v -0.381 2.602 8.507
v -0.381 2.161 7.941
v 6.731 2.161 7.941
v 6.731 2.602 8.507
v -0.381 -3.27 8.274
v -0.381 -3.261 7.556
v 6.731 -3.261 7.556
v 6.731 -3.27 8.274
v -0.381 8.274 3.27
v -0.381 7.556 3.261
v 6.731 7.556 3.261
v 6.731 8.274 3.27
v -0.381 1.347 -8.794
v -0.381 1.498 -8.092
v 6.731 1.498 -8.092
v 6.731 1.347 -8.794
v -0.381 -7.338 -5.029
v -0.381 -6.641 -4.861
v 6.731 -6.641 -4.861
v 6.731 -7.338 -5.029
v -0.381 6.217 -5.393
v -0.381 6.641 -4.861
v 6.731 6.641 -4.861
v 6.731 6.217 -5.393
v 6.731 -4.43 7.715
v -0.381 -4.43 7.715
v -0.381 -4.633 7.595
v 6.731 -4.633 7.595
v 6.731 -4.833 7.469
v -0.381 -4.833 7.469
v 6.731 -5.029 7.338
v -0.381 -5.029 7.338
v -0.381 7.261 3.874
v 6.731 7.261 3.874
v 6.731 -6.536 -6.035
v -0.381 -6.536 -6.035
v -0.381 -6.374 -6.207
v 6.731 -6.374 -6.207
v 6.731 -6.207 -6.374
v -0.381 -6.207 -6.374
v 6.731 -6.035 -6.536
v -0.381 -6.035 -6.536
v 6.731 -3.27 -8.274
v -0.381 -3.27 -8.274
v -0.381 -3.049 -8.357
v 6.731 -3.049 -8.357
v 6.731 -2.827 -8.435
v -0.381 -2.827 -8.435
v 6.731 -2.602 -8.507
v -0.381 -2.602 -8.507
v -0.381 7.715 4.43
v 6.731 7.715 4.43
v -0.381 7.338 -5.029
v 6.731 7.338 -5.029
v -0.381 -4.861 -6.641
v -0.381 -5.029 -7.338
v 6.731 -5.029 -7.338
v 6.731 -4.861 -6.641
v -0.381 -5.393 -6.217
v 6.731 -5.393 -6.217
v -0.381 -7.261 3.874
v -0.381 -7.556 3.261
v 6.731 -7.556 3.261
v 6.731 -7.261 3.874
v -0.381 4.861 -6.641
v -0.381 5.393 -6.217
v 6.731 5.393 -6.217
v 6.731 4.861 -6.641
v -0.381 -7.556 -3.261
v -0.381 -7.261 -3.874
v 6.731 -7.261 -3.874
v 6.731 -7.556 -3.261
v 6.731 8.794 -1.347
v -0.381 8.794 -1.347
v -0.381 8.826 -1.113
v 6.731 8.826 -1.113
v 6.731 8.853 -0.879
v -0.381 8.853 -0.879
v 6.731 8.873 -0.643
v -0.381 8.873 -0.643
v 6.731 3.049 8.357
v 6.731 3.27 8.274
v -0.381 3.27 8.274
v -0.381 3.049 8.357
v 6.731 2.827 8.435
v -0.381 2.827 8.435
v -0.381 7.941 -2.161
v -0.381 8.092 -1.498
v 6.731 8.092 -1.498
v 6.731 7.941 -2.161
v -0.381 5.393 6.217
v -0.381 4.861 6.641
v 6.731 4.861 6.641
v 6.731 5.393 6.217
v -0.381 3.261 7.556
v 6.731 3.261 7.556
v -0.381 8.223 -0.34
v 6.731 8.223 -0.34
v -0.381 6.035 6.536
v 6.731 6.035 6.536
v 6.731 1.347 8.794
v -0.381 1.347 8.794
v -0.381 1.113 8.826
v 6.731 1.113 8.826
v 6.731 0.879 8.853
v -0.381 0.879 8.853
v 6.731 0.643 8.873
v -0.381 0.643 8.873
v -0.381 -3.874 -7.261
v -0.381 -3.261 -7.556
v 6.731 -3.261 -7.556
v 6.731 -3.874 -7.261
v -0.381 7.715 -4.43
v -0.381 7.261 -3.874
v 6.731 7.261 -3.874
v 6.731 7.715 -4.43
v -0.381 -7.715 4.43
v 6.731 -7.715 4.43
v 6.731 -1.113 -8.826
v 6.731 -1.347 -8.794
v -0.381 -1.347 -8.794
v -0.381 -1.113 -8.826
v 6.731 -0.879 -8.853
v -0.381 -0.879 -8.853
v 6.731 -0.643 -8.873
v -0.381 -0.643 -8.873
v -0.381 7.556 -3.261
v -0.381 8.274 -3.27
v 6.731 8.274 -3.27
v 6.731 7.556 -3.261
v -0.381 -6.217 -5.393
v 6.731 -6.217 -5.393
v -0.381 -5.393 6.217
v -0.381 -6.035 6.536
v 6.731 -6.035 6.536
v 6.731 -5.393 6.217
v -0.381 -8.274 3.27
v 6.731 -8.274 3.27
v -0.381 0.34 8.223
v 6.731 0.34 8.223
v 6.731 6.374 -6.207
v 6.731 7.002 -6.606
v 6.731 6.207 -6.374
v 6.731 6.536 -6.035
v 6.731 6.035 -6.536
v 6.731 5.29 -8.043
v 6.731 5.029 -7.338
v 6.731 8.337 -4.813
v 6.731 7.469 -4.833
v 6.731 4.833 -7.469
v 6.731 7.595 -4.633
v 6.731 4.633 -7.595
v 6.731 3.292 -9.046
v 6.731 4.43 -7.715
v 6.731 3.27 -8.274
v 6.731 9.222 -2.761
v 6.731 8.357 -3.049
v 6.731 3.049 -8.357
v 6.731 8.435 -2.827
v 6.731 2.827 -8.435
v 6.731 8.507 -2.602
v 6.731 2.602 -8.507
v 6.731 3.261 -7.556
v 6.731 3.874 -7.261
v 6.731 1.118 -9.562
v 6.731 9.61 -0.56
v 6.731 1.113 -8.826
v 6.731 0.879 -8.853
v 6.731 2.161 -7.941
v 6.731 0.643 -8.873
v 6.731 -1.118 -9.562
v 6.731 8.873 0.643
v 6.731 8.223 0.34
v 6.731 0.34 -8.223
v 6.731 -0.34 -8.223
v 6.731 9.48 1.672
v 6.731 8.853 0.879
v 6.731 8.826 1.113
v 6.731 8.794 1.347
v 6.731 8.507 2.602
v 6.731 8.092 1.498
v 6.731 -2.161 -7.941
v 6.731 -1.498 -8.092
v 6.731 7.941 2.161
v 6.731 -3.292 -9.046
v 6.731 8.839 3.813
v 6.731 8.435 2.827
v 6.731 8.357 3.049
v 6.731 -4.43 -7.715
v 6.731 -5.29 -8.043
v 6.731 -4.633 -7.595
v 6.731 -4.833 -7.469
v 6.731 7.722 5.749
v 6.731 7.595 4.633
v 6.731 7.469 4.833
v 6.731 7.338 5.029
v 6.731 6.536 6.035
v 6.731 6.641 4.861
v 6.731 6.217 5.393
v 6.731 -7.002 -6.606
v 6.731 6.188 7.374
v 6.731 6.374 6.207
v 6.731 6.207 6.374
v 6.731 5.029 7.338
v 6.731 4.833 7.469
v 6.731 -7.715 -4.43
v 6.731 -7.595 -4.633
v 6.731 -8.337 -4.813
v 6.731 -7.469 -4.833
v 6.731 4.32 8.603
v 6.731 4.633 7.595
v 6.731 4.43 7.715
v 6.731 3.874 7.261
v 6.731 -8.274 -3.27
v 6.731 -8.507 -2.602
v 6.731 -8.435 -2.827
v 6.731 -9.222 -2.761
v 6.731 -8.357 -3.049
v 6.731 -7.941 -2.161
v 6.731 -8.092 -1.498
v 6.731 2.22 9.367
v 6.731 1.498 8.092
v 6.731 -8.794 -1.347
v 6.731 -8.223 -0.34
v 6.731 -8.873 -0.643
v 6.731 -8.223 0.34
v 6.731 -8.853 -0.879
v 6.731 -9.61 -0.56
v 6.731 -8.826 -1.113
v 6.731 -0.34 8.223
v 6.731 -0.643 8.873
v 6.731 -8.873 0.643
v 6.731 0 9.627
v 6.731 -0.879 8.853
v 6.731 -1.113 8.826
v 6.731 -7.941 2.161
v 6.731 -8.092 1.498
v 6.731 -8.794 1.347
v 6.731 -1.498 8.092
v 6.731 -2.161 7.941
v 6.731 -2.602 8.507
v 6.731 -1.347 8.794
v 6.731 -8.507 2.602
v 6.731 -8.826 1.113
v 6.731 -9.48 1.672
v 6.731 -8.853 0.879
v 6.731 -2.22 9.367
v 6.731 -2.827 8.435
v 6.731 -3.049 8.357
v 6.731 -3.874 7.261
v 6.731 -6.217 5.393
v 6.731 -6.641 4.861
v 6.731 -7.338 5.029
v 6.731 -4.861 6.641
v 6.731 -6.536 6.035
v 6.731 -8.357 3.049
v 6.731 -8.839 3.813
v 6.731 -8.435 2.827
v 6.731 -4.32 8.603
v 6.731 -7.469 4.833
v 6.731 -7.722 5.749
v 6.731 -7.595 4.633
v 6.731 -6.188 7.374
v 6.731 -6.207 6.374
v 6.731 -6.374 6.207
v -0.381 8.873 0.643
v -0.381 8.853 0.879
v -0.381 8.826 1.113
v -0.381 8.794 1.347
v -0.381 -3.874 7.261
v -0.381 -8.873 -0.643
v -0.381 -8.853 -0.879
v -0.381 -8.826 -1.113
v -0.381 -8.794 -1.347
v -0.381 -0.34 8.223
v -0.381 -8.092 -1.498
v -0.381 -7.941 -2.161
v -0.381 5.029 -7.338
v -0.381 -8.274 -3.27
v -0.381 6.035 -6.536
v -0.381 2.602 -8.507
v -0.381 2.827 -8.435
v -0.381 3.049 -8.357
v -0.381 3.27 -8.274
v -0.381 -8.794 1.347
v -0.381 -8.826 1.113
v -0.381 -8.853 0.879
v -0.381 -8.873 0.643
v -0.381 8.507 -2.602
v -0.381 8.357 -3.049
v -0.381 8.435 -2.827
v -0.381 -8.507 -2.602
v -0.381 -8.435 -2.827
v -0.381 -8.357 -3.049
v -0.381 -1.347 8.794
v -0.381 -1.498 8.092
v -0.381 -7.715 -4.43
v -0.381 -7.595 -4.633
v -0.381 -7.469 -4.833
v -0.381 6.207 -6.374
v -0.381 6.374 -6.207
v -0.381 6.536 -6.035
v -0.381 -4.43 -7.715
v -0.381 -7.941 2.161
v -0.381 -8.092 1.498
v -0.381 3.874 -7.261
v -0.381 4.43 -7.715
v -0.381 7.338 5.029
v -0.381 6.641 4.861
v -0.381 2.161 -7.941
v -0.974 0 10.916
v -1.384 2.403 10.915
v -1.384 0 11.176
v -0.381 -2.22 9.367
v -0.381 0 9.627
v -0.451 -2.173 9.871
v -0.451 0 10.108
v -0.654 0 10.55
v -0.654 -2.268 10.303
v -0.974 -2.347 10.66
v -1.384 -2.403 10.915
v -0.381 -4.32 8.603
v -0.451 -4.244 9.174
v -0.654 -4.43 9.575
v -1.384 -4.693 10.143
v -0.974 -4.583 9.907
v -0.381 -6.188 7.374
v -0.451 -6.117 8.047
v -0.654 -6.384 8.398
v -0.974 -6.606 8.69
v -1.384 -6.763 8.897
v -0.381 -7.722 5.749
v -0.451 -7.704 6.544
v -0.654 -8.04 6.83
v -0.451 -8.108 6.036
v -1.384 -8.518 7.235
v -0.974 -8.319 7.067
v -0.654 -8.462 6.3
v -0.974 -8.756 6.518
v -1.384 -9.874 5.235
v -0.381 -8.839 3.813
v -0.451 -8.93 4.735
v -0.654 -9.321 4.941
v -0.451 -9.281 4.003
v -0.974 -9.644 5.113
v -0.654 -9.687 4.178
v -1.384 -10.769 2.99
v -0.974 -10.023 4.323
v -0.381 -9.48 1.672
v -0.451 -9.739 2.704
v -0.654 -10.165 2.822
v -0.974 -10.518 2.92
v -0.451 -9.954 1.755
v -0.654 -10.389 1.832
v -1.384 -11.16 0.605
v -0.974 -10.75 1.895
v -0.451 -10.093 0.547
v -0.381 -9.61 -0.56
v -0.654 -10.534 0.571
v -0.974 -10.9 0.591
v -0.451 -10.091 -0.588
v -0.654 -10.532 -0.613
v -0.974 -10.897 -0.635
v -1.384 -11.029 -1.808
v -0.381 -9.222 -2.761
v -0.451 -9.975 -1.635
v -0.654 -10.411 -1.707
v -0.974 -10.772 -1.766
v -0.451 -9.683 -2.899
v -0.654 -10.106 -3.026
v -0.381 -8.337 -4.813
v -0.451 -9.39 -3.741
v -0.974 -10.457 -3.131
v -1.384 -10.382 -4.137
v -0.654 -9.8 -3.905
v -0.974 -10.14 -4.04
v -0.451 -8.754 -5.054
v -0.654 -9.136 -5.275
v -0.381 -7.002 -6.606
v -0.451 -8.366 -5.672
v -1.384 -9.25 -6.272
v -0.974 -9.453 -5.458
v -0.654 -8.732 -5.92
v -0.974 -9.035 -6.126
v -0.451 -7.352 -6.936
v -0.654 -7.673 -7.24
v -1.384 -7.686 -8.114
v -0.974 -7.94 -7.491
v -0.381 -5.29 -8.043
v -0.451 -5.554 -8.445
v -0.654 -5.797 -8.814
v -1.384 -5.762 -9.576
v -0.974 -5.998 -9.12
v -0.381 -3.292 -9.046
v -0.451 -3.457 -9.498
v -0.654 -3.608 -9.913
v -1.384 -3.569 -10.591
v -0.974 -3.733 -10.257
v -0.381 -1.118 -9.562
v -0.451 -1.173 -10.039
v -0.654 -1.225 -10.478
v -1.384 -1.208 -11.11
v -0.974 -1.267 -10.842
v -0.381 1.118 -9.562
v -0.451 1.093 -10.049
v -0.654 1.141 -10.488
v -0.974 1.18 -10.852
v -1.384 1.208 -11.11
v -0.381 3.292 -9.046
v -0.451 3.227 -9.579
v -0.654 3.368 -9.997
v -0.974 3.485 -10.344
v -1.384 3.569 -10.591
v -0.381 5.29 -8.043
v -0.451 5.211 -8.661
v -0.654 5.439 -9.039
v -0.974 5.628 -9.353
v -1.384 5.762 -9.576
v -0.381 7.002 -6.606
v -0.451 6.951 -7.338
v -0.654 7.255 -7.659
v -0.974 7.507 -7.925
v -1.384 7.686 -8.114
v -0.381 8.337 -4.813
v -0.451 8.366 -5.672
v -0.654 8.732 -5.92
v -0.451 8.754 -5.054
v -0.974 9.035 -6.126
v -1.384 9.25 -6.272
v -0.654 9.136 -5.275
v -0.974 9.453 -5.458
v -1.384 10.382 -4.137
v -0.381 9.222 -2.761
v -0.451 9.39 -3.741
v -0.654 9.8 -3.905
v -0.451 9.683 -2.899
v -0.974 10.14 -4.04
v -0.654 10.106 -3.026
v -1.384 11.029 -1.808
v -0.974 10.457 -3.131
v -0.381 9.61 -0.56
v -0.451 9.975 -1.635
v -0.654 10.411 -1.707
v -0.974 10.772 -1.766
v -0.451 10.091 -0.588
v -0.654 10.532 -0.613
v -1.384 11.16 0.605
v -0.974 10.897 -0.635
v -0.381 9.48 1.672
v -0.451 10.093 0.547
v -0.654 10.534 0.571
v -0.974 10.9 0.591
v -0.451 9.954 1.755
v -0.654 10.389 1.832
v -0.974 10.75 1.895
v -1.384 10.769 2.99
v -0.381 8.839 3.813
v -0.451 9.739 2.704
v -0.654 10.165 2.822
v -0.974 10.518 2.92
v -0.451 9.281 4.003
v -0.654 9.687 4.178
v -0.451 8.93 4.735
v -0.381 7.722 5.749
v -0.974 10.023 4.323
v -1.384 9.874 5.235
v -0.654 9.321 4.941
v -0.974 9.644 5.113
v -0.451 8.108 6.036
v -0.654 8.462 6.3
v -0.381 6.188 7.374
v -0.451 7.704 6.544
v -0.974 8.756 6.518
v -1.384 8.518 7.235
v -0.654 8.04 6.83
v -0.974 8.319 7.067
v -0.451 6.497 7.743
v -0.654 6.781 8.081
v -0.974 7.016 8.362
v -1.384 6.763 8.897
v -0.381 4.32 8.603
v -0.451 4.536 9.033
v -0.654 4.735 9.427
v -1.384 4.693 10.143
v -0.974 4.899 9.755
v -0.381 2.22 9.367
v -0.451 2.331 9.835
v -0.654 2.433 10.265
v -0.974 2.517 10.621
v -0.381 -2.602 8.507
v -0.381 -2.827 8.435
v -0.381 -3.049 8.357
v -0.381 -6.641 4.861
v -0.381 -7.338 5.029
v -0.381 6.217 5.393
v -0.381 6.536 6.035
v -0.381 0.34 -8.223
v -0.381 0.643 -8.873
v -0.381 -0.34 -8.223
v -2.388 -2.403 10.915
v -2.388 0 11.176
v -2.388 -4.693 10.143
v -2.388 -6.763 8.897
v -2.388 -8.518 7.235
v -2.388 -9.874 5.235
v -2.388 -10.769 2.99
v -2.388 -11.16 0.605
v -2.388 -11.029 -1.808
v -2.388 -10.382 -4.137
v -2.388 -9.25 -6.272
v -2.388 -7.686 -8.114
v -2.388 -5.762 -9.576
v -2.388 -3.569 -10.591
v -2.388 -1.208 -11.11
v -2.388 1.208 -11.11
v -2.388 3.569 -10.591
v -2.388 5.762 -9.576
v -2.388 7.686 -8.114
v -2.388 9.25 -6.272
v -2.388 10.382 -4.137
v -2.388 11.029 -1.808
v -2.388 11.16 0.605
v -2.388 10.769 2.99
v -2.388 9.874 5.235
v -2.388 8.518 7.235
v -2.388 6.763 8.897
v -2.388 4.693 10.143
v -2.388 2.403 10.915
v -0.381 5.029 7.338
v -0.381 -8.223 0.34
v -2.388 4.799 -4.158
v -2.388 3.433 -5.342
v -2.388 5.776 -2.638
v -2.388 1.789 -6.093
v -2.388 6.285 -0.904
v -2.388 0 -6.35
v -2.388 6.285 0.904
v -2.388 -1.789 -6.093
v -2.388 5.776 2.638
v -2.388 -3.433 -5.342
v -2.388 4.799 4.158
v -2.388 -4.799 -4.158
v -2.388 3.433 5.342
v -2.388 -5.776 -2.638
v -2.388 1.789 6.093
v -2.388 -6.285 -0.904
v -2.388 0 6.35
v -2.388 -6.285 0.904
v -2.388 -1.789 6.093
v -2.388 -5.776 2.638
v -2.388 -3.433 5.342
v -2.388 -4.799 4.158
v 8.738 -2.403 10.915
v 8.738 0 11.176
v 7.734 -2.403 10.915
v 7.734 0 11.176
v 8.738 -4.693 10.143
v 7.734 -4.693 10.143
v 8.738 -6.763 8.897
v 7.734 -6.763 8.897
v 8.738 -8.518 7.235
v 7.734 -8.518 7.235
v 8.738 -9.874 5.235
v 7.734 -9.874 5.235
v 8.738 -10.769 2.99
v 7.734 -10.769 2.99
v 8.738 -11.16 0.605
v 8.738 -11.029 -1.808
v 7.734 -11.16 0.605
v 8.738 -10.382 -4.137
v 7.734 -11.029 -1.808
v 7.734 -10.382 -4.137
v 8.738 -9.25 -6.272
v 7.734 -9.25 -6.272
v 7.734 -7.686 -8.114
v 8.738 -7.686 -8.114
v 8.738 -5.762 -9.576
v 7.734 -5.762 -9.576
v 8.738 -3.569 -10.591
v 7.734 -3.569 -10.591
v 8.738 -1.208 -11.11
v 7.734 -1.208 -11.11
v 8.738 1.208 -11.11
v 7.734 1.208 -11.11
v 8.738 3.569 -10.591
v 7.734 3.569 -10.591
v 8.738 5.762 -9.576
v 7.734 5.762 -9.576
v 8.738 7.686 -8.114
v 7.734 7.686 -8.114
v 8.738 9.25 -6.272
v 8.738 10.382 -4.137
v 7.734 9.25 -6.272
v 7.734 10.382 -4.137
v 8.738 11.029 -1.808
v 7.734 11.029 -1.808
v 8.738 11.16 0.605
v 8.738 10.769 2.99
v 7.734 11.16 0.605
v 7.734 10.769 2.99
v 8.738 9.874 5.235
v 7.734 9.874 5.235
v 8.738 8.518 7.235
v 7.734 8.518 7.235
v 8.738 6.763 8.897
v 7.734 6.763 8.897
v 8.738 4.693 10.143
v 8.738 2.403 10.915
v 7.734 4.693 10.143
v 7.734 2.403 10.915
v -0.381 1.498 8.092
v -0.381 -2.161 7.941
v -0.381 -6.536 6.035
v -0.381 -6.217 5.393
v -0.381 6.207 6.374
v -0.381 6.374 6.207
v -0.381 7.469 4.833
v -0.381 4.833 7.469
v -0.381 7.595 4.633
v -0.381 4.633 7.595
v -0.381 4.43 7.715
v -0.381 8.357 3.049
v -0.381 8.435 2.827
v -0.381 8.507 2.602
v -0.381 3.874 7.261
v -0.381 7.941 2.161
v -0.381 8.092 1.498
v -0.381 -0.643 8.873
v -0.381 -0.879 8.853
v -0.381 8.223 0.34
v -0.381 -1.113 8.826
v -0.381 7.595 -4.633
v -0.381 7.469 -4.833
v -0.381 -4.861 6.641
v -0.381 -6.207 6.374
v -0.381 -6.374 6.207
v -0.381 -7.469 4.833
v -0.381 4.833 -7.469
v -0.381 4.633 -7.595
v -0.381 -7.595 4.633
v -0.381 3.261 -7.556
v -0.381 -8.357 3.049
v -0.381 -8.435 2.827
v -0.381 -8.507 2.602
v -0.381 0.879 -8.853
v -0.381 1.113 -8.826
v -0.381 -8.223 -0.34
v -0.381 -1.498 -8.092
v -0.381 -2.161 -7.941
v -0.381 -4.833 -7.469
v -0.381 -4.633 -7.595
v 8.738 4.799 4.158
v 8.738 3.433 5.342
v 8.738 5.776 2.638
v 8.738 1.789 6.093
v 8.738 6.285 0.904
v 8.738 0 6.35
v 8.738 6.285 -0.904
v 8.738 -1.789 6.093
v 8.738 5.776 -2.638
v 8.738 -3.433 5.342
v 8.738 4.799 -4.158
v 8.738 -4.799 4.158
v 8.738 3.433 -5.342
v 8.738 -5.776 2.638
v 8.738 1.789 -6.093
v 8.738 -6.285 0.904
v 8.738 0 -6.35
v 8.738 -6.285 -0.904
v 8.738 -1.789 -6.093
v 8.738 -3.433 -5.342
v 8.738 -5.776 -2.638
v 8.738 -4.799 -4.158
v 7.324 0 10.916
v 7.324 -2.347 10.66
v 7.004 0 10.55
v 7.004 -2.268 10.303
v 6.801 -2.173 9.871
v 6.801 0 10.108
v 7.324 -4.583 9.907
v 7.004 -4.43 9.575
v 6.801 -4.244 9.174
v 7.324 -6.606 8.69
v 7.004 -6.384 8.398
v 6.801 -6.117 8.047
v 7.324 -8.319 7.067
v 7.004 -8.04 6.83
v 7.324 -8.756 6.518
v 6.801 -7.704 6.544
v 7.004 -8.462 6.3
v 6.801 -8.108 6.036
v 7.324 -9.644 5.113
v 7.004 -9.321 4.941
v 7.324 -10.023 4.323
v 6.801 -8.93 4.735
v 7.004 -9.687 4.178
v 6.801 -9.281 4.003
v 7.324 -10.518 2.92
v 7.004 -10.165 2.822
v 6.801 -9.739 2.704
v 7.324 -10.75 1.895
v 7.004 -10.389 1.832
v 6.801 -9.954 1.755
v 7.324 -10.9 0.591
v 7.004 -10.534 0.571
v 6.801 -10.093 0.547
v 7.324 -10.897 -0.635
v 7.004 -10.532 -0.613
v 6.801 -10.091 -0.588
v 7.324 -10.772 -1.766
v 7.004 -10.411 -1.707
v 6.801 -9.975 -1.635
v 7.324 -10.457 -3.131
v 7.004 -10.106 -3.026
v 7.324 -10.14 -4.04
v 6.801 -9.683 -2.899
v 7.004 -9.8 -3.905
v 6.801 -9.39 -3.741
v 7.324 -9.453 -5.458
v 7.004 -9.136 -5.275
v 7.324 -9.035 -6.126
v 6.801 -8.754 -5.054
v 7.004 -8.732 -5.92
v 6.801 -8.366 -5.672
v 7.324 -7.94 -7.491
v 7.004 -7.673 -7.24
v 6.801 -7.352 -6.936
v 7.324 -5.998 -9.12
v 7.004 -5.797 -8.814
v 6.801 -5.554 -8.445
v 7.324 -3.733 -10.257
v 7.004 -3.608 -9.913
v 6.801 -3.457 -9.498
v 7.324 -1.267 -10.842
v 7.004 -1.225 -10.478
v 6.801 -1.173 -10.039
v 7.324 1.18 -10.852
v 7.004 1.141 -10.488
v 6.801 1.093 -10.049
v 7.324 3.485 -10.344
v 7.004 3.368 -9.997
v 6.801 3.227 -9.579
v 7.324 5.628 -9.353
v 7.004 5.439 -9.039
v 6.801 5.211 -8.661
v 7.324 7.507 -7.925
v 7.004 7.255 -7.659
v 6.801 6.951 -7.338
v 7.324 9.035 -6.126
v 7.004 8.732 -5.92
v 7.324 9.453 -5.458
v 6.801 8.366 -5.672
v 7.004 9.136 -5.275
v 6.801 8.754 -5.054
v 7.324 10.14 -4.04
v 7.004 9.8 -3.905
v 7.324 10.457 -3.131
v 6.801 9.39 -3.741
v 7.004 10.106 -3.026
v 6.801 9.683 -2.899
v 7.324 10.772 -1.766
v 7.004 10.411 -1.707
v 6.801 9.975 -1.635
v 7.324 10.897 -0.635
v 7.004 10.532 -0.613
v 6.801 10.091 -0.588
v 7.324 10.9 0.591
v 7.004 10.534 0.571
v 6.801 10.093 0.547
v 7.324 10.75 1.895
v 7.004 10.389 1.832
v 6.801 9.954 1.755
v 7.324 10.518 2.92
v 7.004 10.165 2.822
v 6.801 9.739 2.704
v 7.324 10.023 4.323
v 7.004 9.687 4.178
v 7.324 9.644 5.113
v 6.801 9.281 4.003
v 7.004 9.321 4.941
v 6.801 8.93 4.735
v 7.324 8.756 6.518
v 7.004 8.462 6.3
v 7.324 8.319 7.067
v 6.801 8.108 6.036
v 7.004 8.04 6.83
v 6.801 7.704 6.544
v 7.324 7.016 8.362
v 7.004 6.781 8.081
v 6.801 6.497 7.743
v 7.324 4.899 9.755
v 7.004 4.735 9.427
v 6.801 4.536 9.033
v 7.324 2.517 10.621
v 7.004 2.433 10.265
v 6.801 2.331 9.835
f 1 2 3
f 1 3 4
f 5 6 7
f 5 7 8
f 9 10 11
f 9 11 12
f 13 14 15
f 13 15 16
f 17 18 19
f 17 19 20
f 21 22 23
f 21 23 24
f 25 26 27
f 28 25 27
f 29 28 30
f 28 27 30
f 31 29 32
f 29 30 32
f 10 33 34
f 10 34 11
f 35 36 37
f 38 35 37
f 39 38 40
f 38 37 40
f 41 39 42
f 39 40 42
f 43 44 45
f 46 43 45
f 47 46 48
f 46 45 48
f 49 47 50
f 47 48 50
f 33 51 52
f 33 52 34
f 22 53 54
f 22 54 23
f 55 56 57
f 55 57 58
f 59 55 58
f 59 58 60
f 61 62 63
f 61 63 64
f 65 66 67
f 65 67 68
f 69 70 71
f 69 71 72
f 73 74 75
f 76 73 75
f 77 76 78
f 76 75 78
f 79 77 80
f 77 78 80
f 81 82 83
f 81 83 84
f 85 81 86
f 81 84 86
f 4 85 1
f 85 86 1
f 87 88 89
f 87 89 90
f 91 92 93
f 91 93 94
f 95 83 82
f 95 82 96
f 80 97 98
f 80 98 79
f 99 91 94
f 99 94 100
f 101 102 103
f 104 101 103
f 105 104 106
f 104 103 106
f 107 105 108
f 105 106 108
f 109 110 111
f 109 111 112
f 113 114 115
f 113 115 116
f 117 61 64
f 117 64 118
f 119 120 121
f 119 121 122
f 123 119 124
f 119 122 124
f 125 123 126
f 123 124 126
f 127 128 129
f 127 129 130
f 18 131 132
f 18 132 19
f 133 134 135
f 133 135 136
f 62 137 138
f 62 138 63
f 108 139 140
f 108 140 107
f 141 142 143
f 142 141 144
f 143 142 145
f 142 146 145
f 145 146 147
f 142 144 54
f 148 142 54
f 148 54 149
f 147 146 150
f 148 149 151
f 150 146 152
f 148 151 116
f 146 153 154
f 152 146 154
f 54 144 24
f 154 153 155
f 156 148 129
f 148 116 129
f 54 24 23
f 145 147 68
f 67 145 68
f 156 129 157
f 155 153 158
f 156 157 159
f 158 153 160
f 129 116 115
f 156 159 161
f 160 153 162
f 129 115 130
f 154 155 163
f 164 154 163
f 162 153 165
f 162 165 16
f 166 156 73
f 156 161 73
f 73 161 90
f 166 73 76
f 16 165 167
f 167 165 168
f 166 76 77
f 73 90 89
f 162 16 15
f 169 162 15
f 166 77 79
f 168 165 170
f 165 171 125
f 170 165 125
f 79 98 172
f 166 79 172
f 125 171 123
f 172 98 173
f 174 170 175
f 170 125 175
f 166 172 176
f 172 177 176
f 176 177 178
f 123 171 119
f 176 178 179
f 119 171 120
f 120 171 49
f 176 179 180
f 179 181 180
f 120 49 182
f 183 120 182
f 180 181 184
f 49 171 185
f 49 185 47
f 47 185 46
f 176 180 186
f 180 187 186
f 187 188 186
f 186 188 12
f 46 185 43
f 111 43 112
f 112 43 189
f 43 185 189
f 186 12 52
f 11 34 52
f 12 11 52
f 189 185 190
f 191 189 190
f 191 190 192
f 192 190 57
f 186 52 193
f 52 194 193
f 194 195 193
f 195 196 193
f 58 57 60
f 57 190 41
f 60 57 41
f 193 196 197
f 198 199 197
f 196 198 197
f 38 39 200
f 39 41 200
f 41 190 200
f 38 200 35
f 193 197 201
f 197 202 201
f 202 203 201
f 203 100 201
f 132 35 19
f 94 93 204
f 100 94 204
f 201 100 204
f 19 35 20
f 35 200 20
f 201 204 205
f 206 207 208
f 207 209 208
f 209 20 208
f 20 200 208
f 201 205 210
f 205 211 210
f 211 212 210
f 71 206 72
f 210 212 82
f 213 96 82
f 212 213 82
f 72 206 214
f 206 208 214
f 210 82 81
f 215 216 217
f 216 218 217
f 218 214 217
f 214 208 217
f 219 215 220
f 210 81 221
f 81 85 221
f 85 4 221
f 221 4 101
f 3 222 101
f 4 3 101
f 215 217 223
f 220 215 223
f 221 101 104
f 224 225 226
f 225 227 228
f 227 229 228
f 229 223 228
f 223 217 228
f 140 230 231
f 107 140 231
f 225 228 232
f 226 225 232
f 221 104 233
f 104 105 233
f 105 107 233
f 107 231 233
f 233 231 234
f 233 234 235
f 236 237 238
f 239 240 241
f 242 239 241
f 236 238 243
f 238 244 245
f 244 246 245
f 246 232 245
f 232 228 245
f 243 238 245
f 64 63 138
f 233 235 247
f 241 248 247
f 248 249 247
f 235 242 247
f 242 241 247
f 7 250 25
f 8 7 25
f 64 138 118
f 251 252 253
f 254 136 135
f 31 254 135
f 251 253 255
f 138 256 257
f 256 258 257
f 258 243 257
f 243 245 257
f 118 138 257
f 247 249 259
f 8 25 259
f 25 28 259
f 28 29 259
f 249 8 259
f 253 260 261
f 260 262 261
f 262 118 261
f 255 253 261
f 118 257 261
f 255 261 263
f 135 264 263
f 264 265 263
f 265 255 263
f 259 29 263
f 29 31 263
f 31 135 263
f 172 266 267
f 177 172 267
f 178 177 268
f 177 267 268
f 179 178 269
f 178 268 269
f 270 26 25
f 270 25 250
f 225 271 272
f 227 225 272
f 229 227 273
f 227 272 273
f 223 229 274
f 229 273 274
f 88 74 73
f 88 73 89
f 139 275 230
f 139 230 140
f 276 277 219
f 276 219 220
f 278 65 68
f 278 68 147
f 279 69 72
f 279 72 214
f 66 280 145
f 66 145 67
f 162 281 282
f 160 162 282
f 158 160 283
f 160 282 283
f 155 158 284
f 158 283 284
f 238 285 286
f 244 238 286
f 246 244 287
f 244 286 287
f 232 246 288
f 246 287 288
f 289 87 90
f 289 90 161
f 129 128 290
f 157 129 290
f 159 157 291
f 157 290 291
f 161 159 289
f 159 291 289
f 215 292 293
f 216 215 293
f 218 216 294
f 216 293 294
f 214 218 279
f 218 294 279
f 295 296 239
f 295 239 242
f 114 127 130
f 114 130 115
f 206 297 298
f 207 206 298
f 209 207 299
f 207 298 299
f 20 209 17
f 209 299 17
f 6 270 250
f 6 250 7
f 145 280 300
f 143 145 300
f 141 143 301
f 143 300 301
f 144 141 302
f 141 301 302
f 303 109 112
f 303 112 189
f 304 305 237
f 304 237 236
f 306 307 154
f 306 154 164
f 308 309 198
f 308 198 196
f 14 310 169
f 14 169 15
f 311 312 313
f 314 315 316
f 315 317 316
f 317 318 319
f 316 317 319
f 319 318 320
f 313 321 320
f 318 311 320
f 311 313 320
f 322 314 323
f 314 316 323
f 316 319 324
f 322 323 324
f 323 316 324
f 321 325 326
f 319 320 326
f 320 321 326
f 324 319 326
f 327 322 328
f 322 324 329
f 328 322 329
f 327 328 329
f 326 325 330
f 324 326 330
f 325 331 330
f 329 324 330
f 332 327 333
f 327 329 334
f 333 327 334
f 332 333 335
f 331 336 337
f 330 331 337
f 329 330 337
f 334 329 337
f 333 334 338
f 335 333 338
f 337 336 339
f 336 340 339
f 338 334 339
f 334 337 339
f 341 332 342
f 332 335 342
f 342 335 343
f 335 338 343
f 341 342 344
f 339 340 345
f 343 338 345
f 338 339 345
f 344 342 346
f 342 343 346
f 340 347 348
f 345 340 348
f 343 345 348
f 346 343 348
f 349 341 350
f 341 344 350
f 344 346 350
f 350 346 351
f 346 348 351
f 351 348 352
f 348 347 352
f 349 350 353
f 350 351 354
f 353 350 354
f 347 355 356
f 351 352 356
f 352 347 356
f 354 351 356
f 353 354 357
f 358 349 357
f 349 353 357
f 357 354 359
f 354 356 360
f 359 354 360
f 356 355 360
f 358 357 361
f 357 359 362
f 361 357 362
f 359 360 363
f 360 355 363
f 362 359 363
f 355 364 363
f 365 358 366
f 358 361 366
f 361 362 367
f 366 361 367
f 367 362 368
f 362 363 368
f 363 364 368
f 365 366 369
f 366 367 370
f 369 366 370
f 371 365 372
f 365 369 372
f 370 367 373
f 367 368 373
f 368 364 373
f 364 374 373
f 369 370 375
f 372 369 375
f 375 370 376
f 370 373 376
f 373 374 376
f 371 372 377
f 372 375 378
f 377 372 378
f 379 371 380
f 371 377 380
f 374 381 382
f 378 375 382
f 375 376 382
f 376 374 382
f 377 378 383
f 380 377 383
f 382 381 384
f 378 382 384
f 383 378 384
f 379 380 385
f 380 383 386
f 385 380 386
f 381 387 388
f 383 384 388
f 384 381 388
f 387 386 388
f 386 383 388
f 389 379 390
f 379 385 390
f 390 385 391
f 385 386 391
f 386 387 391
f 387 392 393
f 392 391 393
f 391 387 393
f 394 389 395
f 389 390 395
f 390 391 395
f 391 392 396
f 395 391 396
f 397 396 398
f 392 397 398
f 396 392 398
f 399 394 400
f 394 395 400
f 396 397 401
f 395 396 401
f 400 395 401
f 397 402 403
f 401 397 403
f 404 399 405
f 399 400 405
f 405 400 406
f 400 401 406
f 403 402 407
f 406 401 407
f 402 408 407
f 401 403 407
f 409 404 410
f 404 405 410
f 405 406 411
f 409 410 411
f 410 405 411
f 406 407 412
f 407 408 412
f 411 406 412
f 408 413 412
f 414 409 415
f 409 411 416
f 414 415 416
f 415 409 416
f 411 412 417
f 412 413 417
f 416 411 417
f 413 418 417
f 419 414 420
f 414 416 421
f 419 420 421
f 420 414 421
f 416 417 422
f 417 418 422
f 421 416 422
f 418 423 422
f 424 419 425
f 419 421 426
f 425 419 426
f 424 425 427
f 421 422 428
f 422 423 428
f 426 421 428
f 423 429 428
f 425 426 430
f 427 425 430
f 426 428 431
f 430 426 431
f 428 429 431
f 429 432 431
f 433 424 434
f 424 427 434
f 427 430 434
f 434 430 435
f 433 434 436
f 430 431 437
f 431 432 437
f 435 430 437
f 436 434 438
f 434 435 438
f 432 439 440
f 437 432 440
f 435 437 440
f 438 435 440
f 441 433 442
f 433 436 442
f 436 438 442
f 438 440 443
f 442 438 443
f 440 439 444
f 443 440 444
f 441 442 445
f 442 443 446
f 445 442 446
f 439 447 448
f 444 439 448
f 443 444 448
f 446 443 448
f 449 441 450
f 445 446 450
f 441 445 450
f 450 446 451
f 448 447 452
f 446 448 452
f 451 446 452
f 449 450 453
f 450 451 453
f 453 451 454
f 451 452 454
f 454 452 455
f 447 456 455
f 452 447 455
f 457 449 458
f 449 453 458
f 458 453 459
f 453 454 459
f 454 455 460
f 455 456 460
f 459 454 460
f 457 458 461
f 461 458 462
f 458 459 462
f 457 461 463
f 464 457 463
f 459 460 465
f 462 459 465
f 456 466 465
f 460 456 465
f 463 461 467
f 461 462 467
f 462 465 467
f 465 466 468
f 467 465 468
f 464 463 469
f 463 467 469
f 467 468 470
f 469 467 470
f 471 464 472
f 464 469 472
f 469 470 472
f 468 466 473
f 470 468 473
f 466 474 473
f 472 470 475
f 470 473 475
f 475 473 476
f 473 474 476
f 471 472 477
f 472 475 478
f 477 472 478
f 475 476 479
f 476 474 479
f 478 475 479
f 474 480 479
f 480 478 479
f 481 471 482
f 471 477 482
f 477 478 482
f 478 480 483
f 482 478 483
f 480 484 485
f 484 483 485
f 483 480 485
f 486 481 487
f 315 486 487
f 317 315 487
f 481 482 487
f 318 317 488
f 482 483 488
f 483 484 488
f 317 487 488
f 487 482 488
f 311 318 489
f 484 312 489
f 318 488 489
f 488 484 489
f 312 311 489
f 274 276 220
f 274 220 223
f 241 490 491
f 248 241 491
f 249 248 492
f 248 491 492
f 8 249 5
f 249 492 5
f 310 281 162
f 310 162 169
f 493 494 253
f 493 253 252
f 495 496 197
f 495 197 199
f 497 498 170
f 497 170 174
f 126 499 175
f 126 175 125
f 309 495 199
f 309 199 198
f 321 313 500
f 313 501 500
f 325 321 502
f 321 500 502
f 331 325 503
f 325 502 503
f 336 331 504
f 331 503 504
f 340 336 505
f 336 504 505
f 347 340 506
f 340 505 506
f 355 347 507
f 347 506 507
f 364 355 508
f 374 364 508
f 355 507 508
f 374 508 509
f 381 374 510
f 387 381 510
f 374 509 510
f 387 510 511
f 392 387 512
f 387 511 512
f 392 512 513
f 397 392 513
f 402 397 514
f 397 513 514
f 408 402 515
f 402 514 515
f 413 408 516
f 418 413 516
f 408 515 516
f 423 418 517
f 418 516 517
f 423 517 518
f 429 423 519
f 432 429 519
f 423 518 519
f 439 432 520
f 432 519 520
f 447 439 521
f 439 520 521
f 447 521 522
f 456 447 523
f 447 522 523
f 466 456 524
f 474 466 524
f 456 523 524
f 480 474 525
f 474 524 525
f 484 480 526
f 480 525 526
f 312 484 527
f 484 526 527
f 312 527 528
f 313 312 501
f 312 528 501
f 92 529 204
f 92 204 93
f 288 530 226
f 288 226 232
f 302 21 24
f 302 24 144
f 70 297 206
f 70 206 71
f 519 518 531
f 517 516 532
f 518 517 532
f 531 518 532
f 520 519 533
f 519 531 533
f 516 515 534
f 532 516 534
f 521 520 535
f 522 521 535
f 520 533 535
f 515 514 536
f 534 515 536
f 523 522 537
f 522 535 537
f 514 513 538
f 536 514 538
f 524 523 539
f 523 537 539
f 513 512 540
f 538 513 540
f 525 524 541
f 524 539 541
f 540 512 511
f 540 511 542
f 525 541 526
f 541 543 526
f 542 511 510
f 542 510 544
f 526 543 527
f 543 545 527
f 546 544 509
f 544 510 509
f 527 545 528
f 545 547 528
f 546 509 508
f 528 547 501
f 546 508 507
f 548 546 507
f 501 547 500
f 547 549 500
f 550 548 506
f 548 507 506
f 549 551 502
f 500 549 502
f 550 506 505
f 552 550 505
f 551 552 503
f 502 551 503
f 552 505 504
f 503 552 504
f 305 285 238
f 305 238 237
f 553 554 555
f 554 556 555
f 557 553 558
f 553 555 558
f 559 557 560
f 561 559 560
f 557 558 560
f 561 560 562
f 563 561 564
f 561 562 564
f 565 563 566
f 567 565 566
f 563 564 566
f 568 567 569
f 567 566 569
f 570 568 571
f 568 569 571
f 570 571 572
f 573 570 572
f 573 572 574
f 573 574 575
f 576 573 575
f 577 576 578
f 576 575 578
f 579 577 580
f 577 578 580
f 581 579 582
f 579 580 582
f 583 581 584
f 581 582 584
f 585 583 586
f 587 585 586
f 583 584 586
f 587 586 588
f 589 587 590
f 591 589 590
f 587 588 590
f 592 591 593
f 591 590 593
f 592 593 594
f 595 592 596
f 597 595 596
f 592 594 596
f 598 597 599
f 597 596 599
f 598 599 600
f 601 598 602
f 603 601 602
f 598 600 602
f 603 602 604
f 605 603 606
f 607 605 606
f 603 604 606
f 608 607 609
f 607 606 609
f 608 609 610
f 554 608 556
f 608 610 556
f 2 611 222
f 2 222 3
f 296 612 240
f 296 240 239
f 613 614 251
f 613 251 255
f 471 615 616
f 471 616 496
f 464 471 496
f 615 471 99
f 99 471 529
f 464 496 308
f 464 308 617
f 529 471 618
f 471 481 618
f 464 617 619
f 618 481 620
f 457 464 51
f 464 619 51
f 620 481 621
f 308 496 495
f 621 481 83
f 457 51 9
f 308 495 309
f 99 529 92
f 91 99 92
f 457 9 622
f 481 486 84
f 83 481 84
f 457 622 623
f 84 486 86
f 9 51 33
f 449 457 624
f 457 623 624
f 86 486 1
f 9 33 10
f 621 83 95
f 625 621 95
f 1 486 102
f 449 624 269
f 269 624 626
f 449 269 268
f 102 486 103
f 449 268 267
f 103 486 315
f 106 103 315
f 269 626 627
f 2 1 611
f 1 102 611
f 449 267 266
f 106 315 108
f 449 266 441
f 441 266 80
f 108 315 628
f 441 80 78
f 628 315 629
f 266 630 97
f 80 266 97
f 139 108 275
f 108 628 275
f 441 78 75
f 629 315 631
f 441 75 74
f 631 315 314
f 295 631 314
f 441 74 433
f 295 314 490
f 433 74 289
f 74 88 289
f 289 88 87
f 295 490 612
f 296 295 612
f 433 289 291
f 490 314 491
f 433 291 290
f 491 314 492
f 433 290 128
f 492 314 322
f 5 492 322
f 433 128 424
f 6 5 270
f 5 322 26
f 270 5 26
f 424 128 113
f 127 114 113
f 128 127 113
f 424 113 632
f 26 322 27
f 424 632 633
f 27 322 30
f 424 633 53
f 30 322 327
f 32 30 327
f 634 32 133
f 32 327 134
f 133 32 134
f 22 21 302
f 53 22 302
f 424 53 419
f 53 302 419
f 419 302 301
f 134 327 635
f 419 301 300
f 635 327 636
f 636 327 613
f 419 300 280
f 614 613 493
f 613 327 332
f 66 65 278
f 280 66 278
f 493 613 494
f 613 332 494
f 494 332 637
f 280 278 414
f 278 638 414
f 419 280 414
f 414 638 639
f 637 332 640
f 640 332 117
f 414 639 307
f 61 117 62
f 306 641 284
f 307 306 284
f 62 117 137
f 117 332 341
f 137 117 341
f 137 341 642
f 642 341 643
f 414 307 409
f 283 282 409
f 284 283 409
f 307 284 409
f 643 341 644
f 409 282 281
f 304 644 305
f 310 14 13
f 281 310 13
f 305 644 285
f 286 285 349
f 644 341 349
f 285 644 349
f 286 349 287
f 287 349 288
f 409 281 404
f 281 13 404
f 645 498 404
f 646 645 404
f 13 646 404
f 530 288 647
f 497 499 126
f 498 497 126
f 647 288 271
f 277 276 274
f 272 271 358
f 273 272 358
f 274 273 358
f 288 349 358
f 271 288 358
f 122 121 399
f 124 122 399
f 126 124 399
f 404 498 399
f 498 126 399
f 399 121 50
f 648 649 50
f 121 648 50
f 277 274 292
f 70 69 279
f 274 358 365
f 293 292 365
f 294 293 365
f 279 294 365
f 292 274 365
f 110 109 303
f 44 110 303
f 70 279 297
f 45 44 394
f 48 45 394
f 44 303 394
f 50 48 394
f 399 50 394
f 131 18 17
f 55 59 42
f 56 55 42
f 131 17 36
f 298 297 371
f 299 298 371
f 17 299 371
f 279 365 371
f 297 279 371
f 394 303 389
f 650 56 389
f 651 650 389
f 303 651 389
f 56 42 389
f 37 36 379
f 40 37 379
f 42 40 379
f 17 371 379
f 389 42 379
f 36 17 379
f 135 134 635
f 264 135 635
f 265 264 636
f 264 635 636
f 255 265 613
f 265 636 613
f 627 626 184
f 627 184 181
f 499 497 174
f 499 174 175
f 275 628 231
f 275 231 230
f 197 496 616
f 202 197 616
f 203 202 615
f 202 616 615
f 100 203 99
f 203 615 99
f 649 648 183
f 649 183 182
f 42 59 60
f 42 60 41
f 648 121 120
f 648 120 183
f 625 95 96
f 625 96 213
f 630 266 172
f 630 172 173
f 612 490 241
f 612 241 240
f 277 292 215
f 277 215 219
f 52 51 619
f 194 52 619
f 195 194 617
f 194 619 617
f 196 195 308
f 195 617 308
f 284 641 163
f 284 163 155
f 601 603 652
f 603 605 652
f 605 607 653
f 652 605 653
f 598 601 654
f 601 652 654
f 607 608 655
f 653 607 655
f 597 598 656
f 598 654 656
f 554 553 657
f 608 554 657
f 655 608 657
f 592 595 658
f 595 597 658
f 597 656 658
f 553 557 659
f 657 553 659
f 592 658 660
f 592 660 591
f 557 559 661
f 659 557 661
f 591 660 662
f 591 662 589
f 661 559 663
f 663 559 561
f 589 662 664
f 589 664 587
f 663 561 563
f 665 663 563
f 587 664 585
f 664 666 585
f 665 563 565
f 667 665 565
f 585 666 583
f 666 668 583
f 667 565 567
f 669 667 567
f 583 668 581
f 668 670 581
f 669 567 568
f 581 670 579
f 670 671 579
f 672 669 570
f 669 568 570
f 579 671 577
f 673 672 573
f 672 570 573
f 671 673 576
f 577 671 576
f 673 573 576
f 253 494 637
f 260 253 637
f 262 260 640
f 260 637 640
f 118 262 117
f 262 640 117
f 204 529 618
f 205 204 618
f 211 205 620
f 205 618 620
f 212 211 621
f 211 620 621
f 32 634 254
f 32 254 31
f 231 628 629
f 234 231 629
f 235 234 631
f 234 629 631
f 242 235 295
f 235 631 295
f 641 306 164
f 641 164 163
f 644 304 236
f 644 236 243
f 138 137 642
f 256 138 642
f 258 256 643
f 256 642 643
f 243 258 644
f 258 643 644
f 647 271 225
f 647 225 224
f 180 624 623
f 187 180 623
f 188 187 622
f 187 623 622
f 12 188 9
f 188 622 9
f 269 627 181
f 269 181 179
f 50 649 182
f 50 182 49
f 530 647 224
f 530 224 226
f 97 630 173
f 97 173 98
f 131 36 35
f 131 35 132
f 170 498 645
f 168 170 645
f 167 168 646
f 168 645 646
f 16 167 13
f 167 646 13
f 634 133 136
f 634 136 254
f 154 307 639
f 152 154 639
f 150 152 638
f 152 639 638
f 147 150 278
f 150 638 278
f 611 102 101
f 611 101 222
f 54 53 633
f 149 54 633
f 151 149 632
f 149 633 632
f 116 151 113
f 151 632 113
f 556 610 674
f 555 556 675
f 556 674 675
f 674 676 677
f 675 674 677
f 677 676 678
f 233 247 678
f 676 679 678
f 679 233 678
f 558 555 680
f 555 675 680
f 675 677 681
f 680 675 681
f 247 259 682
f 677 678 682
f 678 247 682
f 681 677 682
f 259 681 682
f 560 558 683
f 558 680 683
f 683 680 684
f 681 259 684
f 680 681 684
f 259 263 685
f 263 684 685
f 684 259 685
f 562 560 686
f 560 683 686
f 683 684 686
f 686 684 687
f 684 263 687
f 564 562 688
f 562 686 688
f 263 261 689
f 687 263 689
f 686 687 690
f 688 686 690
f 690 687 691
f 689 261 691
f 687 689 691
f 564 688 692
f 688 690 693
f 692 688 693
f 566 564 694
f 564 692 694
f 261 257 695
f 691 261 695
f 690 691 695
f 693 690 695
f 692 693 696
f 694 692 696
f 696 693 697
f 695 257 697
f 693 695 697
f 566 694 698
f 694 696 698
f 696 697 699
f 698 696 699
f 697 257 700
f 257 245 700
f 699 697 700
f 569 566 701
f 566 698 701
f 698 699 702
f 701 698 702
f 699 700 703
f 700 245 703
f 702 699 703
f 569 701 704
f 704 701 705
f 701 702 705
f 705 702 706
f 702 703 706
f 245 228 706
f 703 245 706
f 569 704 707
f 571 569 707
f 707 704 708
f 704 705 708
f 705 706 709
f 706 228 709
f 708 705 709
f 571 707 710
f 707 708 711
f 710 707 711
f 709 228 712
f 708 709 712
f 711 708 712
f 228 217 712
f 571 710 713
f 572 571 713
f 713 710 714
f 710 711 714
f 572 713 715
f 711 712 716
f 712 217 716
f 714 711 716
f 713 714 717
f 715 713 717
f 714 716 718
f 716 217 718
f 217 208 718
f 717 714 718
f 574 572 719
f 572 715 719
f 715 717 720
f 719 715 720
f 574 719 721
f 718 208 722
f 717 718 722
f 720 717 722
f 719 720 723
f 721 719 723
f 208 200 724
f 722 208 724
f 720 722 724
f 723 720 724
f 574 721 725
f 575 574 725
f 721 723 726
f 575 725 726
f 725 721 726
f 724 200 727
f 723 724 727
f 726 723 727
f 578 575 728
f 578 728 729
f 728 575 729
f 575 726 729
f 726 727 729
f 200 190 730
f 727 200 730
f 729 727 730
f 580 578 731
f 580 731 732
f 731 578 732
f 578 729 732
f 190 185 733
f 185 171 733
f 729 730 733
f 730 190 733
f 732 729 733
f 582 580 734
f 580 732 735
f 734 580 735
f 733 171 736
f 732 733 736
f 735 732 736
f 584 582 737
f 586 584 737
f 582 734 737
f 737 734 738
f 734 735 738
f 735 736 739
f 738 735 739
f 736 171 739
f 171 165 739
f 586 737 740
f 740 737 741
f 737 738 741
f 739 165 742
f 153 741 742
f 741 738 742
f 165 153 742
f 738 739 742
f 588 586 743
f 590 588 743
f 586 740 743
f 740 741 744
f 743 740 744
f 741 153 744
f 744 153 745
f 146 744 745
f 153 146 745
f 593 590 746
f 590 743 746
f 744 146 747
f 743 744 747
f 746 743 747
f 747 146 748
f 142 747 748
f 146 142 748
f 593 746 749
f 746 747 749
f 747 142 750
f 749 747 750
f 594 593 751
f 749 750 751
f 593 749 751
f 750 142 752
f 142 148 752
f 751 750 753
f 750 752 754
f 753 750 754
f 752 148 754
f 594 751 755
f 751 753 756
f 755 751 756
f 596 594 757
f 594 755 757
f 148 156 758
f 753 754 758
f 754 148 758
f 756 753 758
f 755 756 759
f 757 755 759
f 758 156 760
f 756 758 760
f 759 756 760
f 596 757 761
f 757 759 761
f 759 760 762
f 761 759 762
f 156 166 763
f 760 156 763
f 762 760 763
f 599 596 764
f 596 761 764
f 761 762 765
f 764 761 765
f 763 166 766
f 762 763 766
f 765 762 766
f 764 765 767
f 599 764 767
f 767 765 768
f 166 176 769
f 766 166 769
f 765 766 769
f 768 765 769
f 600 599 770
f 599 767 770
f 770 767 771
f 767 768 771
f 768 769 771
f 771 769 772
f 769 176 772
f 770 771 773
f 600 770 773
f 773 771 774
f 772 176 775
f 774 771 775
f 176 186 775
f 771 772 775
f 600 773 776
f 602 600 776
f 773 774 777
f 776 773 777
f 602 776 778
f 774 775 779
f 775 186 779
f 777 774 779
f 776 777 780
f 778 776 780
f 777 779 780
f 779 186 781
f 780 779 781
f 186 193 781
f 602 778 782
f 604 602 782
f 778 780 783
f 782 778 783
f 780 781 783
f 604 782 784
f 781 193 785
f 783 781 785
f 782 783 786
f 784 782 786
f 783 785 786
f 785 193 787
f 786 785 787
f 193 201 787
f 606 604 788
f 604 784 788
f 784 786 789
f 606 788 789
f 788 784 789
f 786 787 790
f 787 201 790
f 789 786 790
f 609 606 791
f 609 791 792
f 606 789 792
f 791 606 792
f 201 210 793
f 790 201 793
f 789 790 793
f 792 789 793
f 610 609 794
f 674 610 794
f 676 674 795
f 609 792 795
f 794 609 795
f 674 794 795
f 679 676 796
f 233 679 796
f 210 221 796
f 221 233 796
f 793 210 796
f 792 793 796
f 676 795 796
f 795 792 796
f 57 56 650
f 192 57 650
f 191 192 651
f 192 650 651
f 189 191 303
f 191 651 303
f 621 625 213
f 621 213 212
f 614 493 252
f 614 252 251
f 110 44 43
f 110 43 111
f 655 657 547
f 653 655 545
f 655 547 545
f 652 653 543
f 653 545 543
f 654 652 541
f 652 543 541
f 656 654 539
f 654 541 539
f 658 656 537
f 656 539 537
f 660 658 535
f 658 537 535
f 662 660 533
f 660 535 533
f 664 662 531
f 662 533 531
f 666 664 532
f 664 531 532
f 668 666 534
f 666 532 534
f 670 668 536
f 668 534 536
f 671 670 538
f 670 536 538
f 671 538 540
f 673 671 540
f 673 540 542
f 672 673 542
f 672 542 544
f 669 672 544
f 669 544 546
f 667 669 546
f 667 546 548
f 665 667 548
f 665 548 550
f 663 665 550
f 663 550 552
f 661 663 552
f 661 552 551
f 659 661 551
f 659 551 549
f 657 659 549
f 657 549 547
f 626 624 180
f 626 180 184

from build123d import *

# Parameters (mm, degrees)
SKETCH4_R          = 9.0551
SKETCH4_R_2        = 8.89635
CUT_EXTRUDE2_DEPTH = 7.112
CUT_EXTRUDE1_DEPTH = 7.112
CIRPATTERN1_COUNT  = 28
SKETCH6_R          = 6.35
CUT_EXTRUDE3_DEPTH = 24.562439751
SPLIT1_START       = -8.7376
SPLIT1_OUTLINE_R   = 8.7376
SPLIT1_OUTLINE_R_2 = 6.35
SPLIT1_DEPTH       = 6.35


# Read off the part's stored shape, not the designer's step: Split1
with BuildPart() as part:
    # Sketch1 → Revolve1 (revolve)
    with BuildSketch(Plane.XY, mode=Mode.PRIVATE) as revolve1_sk:
        with BuildLine():
            Line((-8.7376, 3.175), (8.7376, 3.175))
            Line((8.7376, 3.175), (8.7376, 11.176))
            Line((8.7376, 11.176), (7.7343, 11.176))
            ThreePointArc((7.7343, 11.176), (7.003726949, 10.549537058), (6.731, 9.6266))
            Line((6.731, 9.6266), (6.731, 9.0551))
            Line((6.731, 9.0551), (-0.381, 9.0551))
            Line((-0.381, 9.0551), (-0.381, 9.6266))
            ThreePointArc((-0.381, 9.6266), (-0.653726949, 10.549537058), (-1.3843, 11.176))
            Line((-1.3843, 11.176), (-2.3876, 11.176))
            Line((-2.3876, 11.176), (-2.3876, 8.7376))
            Line((-2.3876, 8.7376), (-8.7376, 8.7376))
            Line((-8.7376, 8.7376), (-8.7376, 3.175))
        make_face()
    revolve(revolve1_sk.sketch.rotate(Axis((-8.7376, 0, 0), (1, 0, 0)), 90), axis=Axis((-8.7376, 0, 0), (1, 0, 0)))

    # Sketch4 → Cut-Extrude2 (cut)
    with BuildSketch(Plane(origin=(-0.381, 0, 0), x_dir=(0, 0, -1), z_dir=(1, 0, 0))):
        Circle(SKETCH4_R)
        Circle(SKETCH4_R_2, mode=Mode.SUBTRACT)
    extrude(amount=CUT_EXTRUDE2_DEPTH, mode=Mode.SUBTRACT)

    # Sketch3 → Cut-Extrude1 (cut)
    with BuildSketch(Plane(origin=(-0.381, 0, 0), x_dir=(0, 0, -1), z_dir=(1, 0, 0))):
        with BuildLine():
            Line((-0.643388094, 8.873054439), (-0.340062676, 8.222570981))
            Line((-0.340062676, 8.222570981), (0.340062676, 8.222570981))
            Line((0.340062676, 8.222570981), (0.643388094, 8.873054439))
            ThreePointArc((0.643388094, 8.873054439), (0, 8.89635), (-0.643388094, 8.873054439))
        make_face()
    cut_extrude1 = extrude(amount=CUT_EXTRUDE1_DEPTH, mode=Mode.SUBTRACT)

    # CirPattern1: Cut-Extrude1 ×28 about axis
    cirpattern1_axis = Axis((0, 0, 0), (1, 0, 0))
    for i in range(1, CIRPATTERN1_COUNT):
        add(cut_extrude1.rotate(cirpattern1_axis, i * 360 / CIRPATTERN1_COUNT), mode=Mode.SUBTRACT)

    # Sketch6 → Cut-Extrude3 (cut, through all)
    with BuildSketch(Plane.ZY.offset(8.7376)):
        Circle(SKETCH6_R)
    extrude(amount=-CUT_EXTRUDE3_DEPTH, mode=Mode.SUBTRACT)

    # Split1 outline → Split1 (cut)
    with BuildSketch(Plane.YZ.offset(SPLIT1_START)):
        Circle(SPLIT1_OUTLINE_R)
        Circle(SPLIT1_OUTLINE_R_2, mode=Mode.SUBTRACT)
    extrude(amount=SPLIT1_DEPTH, mode=Mode.SUBTRACT)


solid = part.part
